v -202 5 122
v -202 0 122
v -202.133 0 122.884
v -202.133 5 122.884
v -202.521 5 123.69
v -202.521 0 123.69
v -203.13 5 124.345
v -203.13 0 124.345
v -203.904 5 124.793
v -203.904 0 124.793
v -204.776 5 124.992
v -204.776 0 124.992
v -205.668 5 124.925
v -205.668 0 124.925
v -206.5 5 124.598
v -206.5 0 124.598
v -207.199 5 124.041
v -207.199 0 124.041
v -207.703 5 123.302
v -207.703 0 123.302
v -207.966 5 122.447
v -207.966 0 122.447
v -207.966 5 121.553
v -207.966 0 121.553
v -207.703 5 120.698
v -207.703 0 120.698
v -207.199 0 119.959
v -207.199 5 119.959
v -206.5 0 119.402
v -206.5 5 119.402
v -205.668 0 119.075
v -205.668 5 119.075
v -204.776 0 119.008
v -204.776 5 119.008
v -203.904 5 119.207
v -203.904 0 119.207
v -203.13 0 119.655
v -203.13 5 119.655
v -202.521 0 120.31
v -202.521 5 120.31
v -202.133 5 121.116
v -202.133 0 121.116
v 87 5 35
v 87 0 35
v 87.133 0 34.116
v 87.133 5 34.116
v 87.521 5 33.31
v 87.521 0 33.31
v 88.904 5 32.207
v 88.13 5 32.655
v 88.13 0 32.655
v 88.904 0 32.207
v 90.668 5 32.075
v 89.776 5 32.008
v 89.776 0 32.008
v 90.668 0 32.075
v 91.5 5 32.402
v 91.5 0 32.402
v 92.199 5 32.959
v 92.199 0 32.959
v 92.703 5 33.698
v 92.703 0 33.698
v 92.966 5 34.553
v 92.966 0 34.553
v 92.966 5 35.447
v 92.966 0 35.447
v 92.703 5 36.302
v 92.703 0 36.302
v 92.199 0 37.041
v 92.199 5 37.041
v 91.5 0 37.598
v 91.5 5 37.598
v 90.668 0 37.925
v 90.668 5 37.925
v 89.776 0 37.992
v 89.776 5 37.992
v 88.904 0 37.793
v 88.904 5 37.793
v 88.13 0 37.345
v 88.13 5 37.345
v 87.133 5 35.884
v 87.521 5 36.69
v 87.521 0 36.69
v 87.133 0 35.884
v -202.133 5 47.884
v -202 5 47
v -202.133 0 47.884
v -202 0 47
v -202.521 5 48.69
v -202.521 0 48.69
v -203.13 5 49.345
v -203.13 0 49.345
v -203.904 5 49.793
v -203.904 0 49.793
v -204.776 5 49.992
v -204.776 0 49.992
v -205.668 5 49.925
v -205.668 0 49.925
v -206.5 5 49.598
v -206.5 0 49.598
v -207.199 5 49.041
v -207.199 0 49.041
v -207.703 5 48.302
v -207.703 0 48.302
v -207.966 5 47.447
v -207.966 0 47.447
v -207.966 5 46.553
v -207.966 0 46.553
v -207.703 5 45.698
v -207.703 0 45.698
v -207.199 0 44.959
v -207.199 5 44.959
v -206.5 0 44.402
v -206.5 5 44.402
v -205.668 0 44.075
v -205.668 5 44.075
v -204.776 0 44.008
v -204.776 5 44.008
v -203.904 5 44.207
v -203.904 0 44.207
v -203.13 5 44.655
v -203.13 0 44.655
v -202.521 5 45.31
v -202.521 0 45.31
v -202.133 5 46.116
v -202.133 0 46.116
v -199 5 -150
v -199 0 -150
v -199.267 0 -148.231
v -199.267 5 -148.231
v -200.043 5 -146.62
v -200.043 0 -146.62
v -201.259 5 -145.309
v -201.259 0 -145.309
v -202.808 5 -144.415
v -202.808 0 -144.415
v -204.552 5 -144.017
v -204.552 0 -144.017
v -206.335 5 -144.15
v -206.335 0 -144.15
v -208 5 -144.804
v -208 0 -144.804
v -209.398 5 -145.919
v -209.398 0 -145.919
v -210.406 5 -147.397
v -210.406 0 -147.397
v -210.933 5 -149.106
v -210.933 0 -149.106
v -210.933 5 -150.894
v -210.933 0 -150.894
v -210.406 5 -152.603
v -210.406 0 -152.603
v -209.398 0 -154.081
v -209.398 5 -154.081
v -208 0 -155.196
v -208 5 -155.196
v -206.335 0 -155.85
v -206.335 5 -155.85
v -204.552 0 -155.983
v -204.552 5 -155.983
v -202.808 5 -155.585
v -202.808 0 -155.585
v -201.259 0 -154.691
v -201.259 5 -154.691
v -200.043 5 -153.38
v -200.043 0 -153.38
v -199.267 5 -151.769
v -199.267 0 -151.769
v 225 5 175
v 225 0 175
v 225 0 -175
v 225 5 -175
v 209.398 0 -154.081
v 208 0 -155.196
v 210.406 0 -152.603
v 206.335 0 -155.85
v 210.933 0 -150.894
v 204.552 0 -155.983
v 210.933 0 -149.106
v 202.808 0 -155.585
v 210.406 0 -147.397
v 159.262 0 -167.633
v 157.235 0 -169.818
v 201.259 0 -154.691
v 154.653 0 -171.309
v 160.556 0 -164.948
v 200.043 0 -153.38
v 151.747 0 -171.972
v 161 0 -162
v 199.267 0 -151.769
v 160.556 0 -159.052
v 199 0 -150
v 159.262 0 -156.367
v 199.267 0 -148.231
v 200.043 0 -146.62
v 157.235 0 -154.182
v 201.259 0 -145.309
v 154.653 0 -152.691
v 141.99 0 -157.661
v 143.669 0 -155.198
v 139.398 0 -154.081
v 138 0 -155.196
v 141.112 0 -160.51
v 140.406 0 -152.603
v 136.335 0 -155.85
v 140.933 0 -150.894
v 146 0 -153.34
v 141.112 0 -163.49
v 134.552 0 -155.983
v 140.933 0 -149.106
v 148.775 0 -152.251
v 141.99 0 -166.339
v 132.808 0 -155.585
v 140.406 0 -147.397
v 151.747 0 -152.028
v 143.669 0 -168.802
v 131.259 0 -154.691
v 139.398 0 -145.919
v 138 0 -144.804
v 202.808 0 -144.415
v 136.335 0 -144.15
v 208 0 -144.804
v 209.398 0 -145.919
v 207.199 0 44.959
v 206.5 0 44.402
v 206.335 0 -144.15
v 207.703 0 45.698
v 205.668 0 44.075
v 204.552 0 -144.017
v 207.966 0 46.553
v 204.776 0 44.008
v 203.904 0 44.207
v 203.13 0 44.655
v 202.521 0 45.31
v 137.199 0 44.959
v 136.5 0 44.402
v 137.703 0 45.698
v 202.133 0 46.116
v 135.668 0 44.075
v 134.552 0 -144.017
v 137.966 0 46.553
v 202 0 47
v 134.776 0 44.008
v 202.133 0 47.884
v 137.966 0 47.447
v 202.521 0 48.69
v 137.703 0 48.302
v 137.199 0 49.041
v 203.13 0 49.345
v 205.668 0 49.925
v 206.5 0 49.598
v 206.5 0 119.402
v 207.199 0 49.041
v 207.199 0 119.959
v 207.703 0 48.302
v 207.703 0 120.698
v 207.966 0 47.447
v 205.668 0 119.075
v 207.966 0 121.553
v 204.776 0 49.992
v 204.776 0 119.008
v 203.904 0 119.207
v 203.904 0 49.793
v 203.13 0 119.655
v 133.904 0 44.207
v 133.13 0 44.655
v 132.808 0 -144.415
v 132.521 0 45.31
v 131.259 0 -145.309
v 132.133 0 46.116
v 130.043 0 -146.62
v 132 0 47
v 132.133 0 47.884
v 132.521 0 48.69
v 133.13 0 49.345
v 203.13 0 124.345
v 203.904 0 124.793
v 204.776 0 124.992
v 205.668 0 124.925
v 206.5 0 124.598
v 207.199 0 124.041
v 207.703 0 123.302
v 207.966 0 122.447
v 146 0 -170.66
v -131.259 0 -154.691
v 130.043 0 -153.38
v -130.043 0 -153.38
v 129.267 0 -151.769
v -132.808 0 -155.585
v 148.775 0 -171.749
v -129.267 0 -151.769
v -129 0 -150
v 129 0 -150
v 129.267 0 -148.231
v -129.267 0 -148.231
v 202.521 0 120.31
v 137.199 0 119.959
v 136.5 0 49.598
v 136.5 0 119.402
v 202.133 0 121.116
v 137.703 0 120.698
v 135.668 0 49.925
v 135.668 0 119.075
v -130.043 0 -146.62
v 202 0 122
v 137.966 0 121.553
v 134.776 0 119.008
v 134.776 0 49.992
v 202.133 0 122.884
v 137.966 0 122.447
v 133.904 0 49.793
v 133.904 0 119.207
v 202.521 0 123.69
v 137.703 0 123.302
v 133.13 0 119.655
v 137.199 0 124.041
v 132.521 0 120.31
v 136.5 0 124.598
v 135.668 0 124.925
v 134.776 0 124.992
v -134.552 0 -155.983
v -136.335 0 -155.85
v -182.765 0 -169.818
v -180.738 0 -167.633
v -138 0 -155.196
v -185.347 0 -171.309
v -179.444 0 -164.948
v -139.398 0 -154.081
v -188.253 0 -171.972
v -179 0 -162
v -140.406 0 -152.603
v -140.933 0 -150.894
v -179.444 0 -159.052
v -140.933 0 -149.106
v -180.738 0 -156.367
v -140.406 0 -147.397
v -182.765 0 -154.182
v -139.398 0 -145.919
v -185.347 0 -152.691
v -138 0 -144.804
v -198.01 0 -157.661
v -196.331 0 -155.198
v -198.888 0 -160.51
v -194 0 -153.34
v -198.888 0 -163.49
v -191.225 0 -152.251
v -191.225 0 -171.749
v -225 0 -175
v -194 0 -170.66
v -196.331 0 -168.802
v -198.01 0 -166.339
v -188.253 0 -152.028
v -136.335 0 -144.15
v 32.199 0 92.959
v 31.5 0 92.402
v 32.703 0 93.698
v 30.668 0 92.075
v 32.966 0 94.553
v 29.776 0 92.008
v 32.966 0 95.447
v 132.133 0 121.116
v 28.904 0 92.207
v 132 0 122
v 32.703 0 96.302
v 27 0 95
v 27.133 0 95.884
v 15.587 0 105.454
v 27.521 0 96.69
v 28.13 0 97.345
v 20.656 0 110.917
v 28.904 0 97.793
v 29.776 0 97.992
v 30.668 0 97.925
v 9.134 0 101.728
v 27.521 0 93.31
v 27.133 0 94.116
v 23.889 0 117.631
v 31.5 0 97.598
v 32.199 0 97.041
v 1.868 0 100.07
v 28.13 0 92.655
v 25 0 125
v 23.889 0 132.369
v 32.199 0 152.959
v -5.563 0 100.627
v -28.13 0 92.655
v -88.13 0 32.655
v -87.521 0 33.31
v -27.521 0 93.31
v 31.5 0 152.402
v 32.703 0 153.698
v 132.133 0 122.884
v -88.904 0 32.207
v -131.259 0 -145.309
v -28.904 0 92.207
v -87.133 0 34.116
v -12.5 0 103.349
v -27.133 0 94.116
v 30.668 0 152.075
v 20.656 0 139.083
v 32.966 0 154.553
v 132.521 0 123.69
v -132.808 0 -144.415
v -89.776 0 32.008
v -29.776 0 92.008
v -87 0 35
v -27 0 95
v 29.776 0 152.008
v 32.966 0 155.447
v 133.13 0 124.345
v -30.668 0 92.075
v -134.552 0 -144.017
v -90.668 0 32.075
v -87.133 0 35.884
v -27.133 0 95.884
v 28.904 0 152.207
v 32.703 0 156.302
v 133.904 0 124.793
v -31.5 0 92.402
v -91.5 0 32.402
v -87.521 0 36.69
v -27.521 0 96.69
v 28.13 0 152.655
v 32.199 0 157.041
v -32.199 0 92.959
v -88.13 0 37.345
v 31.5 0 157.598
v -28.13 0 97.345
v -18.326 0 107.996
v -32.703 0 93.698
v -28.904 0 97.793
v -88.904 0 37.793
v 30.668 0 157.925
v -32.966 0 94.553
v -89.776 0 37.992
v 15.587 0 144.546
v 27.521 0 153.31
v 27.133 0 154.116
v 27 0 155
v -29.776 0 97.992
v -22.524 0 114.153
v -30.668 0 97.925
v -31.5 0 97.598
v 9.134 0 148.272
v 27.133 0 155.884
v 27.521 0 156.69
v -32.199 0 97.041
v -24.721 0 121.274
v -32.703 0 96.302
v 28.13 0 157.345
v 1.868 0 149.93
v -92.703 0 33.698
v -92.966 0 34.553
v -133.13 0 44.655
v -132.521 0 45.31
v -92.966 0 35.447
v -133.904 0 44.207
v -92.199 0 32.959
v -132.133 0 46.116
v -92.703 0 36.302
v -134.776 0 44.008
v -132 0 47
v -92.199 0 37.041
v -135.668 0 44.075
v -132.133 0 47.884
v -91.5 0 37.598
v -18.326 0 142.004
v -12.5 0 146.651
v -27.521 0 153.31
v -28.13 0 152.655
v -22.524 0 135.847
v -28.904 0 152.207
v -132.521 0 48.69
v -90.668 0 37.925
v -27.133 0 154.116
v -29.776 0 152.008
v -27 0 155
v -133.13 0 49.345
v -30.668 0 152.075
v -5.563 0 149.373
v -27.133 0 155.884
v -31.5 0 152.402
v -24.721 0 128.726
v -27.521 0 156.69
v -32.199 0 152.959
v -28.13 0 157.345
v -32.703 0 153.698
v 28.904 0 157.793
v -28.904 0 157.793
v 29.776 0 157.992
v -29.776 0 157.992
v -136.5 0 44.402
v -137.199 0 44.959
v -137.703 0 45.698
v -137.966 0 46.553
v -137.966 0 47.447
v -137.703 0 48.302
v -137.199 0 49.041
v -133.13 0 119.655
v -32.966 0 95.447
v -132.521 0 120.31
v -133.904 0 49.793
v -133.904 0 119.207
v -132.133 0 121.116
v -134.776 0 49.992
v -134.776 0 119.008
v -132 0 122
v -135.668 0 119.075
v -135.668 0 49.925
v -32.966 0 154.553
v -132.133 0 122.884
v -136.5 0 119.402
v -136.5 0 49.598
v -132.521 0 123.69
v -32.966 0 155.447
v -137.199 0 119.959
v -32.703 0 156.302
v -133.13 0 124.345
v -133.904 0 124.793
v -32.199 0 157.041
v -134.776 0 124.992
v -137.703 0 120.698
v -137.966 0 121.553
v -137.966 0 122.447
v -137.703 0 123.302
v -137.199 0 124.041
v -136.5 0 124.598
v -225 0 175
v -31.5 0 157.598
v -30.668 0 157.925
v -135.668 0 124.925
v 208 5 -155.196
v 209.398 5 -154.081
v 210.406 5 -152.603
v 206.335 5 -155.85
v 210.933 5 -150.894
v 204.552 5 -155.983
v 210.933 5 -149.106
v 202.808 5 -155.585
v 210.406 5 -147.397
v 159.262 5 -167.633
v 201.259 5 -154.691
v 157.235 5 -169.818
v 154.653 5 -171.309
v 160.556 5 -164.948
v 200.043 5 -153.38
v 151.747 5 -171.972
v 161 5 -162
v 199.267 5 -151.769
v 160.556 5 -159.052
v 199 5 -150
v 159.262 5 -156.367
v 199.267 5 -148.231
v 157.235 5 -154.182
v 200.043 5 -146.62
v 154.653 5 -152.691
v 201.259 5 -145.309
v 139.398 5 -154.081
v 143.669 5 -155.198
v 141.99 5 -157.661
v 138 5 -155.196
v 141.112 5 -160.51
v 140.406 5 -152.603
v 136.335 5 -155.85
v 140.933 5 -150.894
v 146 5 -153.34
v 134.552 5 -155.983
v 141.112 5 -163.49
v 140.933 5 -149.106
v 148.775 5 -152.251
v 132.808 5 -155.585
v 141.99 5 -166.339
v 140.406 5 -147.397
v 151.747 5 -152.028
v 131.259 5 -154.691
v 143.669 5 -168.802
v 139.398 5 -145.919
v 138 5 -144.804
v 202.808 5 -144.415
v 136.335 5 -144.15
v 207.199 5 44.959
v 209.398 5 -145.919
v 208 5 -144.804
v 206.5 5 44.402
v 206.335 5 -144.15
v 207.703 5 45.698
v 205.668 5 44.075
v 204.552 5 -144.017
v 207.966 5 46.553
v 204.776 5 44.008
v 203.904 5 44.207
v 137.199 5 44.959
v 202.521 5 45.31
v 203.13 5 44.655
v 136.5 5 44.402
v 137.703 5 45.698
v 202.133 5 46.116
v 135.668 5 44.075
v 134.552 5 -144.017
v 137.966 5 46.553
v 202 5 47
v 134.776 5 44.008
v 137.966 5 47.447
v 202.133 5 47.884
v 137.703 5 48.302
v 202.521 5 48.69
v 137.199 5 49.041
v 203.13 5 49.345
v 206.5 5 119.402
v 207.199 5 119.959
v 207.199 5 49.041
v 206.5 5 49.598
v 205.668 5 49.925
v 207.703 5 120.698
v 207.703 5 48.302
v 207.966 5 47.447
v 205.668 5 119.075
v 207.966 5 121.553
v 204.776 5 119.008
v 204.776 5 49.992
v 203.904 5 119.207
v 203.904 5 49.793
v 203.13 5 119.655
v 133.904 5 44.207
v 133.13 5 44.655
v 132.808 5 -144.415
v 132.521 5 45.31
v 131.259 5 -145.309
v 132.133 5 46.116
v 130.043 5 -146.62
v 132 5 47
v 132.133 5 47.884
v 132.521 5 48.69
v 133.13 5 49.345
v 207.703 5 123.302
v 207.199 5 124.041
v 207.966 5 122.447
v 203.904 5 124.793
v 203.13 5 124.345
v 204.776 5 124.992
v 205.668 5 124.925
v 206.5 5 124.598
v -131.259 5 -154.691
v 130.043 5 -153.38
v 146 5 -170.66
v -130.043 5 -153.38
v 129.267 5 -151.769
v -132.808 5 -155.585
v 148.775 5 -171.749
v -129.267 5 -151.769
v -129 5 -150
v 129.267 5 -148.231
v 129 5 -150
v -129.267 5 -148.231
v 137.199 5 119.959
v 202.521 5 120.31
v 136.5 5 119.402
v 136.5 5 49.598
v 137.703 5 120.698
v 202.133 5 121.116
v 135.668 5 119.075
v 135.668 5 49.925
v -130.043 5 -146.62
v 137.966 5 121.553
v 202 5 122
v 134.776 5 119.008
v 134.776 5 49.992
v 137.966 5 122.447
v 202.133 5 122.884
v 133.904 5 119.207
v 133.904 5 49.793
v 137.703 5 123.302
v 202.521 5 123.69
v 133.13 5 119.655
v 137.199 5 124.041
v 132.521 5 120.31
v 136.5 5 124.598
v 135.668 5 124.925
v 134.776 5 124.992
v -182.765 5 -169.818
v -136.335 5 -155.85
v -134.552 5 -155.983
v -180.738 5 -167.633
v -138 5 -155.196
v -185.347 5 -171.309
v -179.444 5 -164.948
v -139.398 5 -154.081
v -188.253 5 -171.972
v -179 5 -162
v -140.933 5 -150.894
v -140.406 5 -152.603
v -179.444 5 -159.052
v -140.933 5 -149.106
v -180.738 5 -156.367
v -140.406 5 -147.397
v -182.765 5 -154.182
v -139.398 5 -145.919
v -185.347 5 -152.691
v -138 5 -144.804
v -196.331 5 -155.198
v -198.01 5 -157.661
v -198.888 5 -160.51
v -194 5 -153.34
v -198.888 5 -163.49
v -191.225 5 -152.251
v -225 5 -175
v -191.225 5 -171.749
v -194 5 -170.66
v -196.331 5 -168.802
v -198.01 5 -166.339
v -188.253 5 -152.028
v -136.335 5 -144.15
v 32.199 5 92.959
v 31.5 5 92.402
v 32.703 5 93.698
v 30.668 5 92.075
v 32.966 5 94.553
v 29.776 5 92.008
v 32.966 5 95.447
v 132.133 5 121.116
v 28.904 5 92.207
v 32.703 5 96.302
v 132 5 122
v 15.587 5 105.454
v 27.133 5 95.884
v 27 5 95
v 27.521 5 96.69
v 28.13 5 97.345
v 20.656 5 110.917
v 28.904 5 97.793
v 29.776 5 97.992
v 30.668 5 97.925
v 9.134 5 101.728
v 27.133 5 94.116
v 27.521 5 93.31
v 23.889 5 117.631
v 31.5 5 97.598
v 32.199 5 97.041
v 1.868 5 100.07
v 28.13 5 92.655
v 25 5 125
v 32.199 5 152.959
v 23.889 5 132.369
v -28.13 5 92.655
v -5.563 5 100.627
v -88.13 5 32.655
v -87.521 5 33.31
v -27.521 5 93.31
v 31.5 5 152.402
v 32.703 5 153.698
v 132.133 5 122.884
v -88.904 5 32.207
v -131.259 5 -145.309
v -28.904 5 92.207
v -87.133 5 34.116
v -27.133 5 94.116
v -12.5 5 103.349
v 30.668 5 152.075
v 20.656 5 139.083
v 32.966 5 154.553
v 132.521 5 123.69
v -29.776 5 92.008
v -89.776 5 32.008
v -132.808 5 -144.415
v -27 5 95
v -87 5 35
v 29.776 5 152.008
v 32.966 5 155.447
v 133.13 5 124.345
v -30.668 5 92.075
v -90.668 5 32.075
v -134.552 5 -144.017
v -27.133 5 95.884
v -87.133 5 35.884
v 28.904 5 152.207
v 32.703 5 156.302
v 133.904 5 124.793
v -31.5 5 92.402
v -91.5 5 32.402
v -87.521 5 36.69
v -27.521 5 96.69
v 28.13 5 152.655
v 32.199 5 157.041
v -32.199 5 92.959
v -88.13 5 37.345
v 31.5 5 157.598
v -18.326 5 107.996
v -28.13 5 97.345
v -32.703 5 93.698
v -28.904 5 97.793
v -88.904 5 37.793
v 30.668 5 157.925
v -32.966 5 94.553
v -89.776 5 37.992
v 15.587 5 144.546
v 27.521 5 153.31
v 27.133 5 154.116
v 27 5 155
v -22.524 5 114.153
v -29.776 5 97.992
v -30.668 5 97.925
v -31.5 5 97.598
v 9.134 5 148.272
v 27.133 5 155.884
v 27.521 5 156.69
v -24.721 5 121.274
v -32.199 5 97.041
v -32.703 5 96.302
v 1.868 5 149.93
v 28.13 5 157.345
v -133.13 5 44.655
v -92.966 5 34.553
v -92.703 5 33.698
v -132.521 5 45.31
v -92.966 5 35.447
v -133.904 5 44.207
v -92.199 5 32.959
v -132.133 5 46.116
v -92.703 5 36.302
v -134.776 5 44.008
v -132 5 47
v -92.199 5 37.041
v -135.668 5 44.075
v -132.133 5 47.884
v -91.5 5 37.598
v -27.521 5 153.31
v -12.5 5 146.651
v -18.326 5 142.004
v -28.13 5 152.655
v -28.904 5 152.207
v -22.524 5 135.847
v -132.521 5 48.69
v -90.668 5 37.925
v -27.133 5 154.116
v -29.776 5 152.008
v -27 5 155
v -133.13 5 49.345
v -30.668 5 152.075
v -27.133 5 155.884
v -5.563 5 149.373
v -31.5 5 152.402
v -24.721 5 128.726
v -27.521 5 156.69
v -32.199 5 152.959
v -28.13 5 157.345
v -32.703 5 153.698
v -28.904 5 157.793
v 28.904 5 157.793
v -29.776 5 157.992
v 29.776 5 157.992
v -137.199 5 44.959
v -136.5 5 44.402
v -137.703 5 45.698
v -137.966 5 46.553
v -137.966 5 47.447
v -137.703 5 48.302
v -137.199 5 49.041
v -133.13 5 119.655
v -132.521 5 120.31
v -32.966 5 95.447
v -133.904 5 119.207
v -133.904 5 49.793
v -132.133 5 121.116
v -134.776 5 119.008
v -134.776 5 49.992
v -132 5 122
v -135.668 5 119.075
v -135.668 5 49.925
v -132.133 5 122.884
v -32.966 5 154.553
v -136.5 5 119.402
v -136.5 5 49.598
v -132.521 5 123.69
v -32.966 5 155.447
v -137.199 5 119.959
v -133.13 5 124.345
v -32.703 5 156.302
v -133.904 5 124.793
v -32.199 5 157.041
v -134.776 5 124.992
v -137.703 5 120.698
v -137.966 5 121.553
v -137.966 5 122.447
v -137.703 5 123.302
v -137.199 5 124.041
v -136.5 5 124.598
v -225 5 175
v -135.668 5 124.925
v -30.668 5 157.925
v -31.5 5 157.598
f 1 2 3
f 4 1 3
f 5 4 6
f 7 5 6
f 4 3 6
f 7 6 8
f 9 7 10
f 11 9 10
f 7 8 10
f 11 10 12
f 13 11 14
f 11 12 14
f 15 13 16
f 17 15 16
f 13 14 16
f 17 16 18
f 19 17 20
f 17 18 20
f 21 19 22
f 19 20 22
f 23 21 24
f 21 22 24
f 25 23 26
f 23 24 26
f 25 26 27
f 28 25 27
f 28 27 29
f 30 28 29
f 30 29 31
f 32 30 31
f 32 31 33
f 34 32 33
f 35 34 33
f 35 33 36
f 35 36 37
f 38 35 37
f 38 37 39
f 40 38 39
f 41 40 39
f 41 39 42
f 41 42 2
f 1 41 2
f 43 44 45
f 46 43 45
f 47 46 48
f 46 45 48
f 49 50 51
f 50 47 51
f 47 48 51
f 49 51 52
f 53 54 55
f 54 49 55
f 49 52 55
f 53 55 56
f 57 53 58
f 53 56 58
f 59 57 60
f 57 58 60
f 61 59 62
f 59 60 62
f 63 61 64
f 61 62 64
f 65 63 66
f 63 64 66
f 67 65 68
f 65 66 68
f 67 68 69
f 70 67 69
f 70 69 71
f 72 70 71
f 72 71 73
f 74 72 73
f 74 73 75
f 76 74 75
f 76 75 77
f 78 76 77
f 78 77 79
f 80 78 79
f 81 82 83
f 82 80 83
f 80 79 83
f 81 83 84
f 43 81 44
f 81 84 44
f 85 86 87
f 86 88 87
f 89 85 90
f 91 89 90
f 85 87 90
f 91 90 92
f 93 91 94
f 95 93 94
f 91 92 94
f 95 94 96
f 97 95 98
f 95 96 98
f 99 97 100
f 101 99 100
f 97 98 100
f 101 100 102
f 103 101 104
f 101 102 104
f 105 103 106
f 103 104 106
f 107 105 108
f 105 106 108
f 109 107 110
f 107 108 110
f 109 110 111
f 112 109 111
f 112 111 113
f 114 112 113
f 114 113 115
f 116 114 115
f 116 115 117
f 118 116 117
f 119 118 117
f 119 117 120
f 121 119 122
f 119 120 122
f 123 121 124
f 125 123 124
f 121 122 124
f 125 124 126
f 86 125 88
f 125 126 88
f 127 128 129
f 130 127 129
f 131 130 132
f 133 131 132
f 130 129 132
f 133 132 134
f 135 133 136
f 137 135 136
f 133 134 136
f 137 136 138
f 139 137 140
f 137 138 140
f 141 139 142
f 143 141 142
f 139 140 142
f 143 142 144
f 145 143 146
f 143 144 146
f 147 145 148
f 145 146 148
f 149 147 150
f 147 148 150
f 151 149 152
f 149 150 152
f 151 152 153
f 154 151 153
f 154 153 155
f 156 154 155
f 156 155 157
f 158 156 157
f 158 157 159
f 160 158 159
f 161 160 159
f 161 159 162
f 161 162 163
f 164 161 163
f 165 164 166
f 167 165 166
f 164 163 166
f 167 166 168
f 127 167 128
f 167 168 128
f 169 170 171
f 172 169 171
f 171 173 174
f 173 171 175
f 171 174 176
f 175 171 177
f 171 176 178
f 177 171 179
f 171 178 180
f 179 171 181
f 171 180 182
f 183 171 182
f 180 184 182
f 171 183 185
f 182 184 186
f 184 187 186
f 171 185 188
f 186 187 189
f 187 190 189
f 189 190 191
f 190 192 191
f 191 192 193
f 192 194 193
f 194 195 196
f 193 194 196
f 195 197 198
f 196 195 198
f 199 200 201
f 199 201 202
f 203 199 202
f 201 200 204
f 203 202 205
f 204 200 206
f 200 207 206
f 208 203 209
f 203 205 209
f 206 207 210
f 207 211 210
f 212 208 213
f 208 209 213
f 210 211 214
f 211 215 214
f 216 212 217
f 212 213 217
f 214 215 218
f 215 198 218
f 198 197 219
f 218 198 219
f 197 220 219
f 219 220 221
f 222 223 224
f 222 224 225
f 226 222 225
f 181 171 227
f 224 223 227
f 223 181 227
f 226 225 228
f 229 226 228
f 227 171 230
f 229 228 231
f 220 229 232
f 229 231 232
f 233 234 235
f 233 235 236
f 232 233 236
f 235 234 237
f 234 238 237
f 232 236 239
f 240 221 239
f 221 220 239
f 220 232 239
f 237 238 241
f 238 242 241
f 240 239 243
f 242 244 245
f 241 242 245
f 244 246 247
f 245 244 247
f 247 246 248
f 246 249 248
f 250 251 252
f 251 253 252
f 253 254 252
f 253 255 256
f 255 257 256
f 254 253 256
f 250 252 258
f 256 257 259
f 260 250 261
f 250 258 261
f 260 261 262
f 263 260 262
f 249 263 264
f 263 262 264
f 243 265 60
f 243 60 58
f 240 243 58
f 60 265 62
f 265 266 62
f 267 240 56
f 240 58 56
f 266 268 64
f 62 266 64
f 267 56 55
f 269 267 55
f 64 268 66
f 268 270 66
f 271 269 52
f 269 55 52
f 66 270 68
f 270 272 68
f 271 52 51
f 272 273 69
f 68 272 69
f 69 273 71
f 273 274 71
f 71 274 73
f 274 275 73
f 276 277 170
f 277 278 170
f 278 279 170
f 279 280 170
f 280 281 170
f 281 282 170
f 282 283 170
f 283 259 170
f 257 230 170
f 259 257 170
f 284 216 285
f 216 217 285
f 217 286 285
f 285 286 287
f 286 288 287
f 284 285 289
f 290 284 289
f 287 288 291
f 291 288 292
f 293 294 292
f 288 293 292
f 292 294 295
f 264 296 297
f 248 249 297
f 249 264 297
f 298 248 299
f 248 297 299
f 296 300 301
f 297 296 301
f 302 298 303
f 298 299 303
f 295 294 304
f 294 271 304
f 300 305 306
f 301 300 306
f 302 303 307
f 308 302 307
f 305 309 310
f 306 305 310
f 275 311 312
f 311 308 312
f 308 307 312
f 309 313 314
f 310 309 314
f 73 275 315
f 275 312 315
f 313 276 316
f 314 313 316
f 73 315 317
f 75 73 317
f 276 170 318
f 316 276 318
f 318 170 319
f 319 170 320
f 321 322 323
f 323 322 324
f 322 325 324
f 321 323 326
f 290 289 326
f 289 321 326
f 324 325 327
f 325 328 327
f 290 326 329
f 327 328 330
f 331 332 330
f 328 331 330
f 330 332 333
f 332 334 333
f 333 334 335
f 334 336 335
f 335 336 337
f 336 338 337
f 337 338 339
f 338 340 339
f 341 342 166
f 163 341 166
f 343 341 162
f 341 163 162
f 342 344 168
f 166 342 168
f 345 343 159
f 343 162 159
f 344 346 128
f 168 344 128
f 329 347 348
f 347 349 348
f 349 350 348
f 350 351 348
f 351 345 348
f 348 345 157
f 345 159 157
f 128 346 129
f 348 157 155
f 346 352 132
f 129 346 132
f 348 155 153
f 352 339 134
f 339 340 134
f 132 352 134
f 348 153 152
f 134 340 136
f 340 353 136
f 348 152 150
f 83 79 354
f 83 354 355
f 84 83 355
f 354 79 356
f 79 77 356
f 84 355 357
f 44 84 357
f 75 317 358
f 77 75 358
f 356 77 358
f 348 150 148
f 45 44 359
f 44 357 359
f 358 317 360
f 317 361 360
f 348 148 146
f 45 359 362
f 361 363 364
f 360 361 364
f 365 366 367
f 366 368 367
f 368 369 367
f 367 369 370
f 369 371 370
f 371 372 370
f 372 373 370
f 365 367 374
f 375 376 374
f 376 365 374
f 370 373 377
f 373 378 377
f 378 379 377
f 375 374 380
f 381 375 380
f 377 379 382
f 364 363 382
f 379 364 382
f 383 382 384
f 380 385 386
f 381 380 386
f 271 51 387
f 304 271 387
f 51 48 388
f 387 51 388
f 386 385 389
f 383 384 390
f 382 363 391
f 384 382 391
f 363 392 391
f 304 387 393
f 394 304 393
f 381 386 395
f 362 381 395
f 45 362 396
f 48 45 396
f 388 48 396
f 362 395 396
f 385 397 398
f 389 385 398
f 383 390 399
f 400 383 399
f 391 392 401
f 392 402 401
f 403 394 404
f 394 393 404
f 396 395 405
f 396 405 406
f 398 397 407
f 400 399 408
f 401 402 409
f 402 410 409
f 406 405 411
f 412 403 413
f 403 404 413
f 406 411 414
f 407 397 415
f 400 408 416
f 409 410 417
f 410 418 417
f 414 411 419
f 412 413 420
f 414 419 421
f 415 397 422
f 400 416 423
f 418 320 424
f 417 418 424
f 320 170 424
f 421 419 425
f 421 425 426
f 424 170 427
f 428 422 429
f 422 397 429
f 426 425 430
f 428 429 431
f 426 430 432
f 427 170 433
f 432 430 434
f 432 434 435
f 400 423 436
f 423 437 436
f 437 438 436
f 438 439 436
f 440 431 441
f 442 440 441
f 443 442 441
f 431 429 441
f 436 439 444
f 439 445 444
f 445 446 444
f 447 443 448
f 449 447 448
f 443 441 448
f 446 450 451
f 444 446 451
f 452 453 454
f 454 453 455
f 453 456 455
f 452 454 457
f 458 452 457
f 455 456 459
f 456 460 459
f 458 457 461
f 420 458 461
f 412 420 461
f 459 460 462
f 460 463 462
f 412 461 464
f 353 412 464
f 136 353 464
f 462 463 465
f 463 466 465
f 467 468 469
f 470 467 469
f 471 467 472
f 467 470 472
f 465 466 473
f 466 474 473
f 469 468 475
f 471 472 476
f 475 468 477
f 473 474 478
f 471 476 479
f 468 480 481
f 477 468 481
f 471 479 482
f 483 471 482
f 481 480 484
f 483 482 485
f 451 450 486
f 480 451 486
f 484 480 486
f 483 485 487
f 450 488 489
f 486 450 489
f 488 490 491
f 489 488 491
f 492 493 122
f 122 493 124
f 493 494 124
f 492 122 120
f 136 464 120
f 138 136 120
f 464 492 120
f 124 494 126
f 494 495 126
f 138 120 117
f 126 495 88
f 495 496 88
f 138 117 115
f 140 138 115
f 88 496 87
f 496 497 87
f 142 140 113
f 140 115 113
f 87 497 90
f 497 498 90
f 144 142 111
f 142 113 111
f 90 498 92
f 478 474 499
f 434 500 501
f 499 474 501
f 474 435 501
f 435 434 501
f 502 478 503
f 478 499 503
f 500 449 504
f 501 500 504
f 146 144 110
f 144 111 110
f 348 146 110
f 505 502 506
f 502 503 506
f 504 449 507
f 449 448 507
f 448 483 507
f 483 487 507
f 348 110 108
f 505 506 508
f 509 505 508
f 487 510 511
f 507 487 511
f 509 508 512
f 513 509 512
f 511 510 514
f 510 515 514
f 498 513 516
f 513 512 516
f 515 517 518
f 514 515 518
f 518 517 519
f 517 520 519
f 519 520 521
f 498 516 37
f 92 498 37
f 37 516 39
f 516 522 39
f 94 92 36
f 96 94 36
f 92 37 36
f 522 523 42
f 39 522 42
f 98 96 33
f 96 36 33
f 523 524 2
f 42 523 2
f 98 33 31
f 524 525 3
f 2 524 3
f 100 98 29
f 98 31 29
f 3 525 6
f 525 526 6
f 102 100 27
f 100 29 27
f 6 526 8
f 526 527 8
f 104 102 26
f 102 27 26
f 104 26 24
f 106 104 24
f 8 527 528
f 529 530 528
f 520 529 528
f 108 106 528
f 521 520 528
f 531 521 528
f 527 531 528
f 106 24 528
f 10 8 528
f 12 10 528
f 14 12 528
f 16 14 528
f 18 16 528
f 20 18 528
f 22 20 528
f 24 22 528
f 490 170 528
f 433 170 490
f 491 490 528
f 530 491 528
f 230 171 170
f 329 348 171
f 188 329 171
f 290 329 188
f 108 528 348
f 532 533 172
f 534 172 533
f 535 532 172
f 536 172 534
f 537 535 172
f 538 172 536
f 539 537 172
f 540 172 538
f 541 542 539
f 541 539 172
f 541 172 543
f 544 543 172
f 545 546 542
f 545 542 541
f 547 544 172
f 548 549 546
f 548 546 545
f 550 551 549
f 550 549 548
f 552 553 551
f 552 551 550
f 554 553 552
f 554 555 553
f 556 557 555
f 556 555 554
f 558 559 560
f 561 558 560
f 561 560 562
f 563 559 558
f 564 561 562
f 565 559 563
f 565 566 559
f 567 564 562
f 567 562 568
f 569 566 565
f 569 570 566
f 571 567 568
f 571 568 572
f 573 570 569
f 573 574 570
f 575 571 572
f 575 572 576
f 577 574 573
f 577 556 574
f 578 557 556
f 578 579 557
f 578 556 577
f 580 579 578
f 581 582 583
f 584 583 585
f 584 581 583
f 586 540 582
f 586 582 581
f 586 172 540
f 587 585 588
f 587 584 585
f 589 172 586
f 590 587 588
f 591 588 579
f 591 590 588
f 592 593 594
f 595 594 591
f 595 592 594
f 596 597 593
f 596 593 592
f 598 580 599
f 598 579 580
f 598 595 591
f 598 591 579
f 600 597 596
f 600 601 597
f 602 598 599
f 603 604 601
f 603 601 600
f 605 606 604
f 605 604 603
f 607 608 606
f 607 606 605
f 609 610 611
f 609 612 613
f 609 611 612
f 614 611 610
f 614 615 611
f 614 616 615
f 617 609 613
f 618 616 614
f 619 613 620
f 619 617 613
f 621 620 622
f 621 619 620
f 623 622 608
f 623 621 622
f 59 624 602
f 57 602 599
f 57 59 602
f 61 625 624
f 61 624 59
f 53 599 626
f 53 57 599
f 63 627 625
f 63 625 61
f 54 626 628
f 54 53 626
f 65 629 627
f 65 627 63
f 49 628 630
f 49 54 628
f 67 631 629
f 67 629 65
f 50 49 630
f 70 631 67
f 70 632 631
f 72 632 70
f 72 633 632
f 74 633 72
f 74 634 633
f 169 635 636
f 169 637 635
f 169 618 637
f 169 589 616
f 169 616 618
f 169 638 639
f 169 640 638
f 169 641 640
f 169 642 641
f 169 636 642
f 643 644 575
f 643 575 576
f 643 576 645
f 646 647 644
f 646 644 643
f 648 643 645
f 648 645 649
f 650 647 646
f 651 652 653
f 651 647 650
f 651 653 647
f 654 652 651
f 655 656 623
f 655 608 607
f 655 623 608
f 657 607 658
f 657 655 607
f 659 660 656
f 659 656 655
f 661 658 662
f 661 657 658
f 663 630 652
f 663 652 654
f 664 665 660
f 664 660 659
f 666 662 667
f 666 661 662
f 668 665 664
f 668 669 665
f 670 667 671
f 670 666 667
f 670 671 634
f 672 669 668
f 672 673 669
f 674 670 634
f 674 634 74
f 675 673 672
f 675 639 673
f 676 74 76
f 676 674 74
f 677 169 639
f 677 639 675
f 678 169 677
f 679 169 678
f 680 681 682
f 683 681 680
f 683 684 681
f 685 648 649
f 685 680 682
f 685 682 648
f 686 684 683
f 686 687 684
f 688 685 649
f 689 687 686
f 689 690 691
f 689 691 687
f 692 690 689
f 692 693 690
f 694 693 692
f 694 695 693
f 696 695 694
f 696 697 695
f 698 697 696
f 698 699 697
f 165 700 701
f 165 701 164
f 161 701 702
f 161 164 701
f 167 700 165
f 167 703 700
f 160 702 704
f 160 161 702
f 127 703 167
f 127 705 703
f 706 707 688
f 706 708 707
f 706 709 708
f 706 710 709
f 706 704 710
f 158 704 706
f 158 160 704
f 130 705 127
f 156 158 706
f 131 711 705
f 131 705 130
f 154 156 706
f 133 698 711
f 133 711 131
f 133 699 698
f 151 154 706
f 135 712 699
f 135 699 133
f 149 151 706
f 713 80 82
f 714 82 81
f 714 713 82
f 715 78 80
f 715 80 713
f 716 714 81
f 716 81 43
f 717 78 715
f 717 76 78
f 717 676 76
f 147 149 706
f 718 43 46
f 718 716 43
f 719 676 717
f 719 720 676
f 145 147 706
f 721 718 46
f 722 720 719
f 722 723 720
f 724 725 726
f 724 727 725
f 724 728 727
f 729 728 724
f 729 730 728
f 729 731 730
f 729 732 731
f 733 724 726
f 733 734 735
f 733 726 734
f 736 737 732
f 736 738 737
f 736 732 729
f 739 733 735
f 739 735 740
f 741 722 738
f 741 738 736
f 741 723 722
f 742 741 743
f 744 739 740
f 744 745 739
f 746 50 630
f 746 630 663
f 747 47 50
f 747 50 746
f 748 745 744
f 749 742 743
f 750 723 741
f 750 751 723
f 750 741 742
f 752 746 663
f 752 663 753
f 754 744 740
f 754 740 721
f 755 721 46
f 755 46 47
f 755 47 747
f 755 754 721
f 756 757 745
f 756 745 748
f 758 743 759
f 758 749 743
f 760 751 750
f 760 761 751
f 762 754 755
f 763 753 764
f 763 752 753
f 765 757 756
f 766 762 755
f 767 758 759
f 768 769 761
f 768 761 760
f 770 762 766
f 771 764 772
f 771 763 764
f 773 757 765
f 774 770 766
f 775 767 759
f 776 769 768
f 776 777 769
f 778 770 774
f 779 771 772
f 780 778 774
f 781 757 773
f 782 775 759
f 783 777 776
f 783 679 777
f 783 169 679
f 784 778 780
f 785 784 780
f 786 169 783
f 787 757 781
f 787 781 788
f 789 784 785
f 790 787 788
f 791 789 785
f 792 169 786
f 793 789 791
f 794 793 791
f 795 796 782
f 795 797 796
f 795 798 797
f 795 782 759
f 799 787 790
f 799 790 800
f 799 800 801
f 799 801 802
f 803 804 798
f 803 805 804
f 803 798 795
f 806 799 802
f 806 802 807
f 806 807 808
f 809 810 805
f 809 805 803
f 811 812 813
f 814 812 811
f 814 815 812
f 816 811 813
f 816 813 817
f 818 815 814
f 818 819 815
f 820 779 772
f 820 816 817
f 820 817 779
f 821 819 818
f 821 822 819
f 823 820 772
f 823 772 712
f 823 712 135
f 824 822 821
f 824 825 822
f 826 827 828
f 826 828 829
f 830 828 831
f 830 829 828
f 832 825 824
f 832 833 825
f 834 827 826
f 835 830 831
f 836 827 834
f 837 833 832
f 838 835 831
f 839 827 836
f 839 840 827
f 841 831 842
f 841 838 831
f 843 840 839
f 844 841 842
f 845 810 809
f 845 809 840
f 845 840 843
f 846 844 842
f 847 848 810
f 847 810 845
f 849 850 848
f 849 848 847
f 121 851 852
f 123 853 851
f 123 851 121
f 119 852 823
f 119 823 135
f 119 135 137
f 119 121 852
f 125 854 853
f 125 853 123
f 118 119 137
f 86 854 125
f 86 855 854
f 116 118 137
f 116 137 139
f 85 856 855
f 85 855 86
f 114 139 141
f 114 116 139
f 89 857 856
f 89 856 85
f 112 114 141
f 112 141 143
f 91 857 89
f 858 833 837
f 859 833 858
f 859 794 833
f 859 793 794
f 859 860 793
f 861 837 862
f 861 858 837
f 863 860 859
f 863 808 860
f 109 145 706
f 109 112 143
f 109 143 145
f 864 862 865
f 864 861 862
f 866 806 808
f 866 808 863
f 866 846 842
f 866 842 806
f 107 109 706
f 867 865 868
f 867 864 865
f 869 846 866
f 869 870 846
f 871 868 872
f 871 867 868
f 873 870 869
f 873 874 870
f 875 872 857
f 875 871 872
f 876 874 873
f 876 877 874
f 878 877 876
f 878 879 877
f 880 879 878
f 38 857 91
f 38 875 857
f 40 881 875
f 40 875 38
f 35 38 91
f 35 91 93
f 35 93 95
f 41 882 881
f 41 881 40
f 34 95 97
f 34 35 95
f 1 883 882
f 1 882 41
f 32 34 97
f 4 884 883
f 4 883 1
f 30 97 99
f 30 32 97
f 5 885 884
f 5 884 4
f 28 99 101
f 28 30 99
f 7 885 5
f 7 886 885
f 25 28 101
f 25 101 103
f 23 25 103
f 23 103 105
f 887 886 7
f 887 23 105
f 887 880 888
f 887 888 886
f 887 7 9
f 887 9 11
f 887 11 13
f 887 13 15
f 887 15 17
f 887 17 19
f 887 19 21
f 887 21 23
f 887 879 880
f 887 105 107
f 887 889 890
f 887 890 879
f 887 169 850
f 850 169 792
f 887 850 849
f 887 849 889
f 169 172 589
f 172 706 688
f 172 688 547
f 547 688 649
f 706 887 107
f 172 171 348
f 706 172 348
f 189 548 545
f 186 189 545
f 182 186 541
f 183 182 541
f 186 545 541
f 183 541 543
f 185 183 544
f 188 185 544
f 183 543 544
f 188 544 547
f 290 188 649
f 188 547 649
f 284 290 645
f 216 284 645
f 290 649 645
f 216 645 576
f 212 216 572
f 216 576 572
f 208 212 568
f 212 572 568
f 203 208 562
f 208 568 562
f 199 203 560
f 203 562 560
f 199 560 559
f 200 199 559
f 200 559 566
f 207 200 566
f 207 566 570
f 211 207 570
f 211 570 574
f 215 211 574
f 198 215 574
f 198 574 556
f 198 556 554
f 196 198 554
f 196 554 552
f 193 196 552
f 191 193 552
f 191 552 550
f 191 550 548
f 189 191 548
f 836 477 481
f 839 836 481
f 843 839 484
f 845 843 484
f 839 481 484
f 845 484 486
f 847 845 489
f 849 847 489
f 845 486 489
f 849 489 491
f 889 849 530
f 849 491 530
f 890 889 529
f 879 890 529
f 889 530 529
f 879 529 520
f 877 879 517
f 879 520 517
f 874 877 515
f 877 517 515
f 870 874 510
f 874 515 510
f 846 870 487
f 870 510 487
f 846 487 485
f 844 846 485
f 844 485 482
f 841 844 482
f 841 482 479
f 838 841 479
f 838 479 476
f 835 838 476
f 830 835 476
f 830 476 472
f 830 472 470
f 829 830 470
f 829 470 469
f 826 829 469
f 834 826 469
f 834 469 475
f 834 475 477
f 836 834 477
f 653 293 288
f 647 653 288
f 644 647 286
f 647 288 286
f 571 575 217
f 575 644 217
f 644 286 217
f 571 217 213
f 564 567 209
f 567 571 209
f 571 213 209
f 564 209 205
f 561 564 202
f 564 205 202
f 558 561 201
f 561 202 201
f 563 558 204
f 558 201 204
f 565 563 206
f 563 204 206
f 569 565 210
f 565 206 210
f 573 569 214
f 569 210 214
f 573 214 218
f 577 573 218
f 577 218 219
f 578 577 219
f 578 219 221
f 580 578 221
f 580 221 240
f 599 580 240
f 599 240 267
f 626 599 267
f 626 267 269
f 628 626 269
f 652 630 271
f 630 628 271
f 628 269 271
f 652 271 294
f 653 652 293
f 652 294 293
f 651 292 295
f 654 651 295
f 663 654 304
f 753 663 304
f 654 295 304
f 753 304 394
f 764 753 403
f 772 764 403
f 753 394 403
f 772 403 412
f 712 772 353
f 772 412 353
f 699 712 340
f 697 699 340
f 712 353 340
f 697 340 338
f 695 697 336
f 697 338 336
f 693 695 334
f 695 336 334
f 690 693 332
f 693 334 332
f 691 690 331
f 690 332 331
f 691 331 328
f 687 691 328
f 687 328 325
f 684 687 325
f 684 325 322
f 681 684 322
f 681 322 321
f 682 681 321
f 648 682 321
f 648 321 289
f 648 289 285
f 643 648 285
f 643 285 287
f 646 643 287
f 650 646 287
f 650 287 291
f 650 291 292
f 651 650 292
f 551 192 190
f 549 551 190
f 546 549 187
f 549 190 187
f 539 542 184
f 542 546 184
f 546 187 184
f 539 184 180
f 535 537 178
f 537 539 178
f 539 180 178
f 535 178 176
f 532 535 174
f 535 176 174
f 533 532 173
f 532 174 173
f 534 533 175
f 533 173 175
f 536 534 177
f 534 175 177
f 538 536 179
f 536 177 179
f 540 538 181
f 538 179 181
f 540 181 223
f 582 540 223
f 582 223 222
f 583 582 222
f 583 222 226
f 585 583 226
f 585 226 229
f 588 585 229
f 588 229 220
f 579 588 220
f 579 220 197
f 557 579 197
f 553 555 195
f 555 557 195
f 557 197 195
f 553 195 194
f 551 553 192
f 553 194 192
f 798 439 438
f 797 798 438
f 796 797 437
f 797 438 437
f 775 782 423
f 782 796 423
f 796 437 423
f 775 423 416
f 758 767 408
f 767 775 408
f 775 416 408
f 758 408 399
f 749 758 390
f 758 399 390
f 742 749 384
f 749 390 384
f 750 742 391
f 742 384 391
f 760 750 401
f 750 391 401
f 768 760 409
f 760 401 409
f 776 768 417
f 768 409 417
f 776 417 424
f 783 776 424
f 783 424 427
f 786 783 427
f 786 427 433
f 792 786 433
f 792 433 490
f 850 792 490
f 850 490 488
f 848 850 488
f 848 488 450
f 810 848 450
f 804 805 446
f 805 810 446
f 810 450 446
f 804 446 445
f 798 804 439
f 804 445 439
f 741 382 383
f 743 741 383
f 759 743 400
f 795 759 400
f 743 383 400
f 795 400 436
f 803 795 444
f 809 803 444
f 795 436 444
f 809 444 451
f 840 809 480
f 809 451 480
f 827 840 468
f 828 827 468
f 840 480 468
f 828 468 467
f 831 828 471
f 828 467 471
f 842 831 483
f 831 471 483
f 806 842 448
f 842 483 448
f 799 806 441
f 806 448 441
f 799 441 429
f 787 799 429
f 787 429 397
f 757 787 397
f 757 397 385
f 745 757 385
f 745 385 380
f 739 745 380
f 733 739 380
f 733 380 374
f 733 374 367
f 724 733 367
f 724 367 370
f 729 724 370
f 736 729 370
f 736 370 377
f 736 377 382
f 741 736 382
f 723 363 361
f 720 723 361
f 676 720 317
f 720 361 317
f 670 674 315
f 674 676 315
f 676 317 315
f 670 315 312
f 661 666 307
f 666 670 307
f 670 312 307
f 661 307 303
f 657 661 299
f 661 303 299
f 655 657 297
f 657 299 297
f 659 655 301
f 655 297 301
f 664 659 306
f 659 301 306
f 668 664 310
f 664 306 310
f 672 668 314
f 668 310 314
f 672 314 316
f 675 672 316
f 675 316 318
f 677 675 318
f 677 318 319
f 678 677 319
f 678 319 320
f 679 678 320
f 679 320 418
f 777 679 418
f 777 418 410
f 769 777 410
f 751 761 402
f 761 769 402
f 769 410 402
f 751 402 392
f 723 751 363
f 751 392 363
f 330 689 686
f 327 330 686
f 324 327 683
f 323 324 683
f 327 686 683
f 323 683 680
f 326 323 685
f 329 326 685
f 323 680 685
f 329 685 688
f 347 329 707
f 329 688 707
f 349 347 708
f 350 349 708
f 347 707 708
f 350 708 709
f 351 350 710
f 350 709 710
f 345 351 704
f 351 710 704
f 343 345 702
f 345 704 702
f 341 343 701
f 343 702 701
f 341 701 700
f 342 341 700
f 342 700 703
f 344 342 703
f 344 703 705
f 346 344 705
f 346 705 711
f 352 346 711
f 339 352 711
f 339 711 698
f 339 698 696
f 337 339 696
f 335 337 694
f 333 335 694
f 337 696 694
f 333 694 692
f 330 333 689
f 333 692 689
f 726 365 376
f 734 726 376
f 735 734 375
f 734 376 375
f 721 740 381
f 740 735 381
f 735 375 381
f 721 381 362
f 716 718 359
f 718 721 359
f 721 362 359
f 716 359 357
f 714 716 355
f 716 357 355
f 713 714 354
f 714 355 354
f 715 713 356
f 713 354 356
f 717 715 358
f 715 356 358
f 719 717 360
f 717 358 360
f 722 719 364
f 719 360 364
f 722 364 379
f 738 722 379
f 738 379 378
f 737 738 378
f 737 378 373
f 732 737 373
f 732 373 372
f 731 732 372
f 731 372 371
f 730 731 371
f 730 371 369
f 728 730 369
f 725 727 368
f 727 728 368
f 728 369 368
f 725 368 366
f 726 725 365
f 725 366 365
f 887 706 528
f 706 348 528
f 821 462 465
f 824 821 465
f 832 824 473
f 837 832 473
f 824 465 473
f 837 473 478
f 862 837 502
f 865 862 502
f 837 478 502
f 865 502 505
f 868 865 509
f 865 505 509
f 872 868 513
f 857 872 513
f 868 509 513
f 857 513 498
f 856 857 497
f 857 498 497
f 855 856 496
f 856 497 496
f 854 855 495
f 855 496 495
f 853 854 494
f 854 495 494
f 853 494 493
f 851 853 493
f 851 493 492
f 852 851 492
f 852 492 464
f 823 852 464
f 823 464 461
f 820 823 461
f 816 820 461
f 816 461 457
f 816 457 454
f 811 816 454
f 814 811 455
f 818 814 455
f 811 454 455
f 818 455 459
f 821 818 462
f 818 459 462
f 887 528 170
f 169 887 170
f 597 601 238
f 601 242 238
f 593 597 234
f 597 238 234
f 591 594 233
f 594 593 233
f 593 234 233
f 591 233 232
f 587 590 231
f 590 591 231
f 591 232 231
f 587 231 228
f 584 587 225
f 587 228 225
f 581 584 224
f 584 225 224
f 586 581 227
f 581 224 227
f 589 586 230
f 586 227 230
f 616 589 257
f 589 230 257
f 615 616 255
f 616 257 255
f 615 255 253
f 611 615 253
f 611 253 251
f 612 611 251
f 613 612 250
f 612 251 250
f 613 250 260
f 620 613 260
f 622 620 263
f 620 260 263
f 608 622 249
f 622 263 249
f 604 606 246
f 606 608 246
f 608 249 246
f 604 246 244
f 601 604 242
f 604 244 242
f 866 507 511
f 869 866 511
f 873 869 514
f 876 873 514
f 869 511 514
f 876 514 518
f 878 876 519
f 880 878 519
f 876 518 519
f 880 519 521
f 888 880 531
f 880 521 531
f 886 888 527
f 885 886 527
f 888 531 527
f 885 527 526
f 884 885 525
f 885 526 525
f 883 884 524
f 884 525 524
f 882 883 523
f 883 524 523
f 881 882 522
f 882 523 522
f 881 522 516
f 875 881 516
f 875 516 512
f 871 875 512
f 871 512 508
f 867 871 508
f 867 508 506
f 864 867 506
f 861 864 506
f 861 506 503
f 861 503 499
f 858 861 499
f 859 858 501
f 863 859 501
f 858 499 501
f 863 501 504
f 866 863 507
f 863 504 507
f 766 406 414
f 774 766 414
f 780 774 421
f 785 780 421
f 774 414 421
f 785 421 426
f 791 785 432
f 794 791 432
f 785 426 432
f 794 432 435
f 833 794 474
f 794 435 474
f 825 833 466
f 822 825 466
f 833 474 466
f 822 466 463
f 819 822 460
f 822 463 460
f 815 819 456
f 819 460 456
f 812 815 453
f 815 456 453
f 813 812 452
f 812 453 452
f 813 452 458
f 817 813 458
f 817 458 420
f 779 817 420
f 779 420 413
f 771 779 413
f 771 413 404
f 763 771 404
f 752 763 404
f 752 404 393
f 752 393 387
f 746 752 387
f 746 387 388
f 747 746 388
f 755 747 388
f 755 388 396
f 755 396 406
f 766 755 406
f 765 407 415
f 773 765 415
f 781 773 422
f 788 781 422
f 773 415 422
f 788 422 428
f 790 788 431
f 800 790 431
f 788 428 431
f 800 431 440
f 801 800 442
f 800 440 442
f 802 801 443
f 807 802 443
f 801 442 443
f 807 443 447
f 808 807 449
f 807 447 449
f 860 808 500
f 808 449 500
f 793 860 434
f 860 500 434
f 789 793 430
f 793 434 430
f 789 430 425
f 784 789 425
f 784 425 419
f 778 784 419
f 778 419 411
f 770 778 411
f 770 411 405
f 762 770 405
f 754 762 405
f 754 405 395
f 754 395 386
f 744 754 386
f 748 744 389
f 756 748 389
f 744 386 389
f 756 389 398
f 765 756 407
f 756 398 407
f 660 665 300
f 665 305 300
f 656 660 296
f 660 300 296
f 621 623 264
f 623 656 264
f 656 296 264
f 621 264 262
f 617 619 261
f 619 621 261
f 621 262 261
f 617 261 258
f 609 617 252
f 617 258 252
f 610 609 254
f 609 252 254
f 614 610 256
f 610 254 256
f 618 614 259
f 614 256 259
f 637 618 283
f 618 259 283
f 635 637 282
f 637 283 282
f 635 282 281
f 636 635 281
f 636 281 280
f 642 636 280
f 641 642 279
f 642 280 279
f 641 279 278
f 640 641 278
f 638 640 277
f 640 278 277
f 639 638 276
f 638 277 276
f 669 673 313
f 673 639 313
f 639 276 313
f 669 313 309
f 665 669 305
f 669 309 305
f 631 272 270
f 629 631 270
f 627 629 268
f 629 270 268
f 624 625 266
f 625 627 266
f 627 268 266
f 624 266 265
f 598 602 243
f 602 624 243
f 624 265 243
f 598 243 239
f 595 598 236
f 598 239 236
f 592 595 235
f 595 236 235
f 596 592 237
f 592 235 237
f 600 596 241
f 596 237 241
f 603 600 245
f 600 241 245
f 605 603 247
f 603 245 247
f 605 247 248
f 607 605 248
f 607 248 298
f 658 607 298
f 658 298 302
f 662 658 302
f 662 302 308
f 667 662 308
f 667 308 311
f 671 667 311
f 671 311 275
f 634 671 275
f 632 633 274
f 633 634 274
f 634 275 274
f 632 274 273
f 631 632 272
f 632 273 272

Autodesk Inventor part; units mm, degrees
ref_plane "YZ Plane" through (0, 0, 0) normal (1, 0, 0) x (0, 1, 0)
ref_plane "XZ Plane" through (0, 0, 0) normal (0, 1, 0) x (-1, 0, 0)
ref_plane "XY Plane" through (0, 0, 0) normal (0, 0, 1) x (1, 0, 0)
sketch "Sketch1" plane through (0, 0, 0) normal (0, 1, 0) x (-1, 0, 0)
  line L0 (225, 175) -> (-225, 175)
  line L1 (-225, 175) -> (-225, -175)
  line L2 (-225, -175) -> (225, -175)
  line L3 (225, -175) -> (225, 175)
  line L4 (225, 175) -> (-225, -175) construction
  line L5 (-225, 175) -> (225, -175) construction
  point P0 (0, 0)
  dimension "d0" = 450
  dimension "d1" = 350
extrude "Extrusion1" add sketch "Sketch1" along normal blind 5
sketch "Sketch2" plane through (0, 0, 0) normal (0, -1, 0) x (1, 0, 0)
  line L0 (225, 175) -> (225, -175) projected
  line L1 (-225, 175) -> (225, 175) projected
  line L2 (-225, -175) -> (-225, 175) projected
  line L3 (225, -175) -> (-225, -175) projected
  line L4 (-198.5, -164) -> (-198.5, -170) projected
  line L5 (-220, -170) -> (-198.5, -170) projected
  line L6 (-220, -115) -> (-220, -170) projected
  line L7 (-220, -115) -> (-120, -115) projected
  line L8 (-120, -115) -> (-120, -170) projected
  line L9 (-180, -170) -> (-120, -170) projected
  line L10 (-180, -170) -> (-180, -159) projected
  arc A0 (-180, -159) -> (-185, -154) centre (-185, -159) ccw projected
  line L11 (-185, -154) -> (-188.5, -154) projected
  arc A1 (-188.5, -154) -> (-198.5, -164) centre (-188.5, -164) ccw projected
  circle A2 centre (-205, -150) radius 6.1 projected
  circle A3 centre (-135, -150) radius 6.1 projected
  circle A4 centre (-205, 122) radius 3.05 projected
  circle A5 centre (-135, 47) radius 3.05 projected
  circle A6 centre (-135, 122) radius 3.05 projected
  circle A7 centre (-205, 47) radius 3.05 projected
  line L12 (-120, 134.5) -> (-120, 34.5) projected
  line L13 (-220, 34.5) -> (-120, 34.5) projected
  line L14 (-220, 134.5) -> (-220, 34.5) projected
  line L15 (-120, 134.5) -> (-220, 134.5) projected
  circle A8 centre (30, 95) radius 3.1 projected
  circle A9 centre (30, 155) radius 3.1 projected
  circle A10 centre (-30, 95) radius 3.1 projected
  circle A11 centre (-30, 155) radius 3.1 projected
  circle A12 centre (90, 215) radius 3.1 projected
  circle A13 centre (90, 35) radius 3.1 projected
  circle A14 centre (-90, 215) radius 3.1 projected
  circle A15 centre (-90, 35) radius 3.1 projected
  circle A16 centre (0, 125) radius 25 projected
  line L16 (100, 225) -> (100, 25) projected
  line L17 (100, 25) -> (-100, 25) projected
  line L18 (-100, 25) -> (-100, 225) projected
  line L19 (-100, 225) -> (100, 225) projected
  circle A17 centre (-205, -150) radius 6
  circle A18 centre (-135, -150) radius 6
  circle A19 centre (-205, 47) radius 3
  circle A20 centre (-205, 122) radius 3
  circle A21 centre (-135, 47) radius 3
  circle A22 centre (-135, 122) radius 3
  circle A23 centre (-90, 35) radius 3
  circle A24 centre (-30, 155) radius 3
  circle A25 centre (-30, 95) radius 3
  point P0 (0, 0)
  dimension "d4" = 12
  dimension "d5" = 12
  dimension "d6" = 6
  dimension "d7" = 6
  dimension "d8" = 6
  dimension "d9" = 6
  dimension "d10" = 6
  dimension "d11" = 6
  dimension "d12" = 6
extrude "Extrusion2" cut sketch "Sketch2" against normal blind 5 contours A17 | A18 | A19 | A20 | A21 | A22 | A23 | A24 | A25
mirror "Mirror1" about plane through (0, 0, 0) normal (1, 0, 0) of "Extrusion2"
sketch "Sketch3" plane through (0, 0, 0) normal (0, -1, 0) x (1, 0, 0)
  circle A0 centre (30, 95) radius 3.1 projected
  circle A1 centre (30, 155) radius 3.1 projected
  circle A2 centre (-30, 95) radius 3.1 projected
  circle A3 centre (-30, 155) radius 3.1 projected
  circle A4 centre (90, 215) radius 3.1 projected
  circle A5 centre (90, 35) radius 3.1 projected
  circle A6 centre (-90, 215) radius 3.1 projected
  circle A7 centre (-90, 35) radius 3.1 projected
  circle A8 centre (0, 125) radius 25 projected
  line L0 (100, 225) -> (100, 25) projected
  line L1 (100, 25) -> (-100, 25) projected
  line L2 (-100, 25) -> (-100, 225) projected
  line L3 (-100, 225) -> (100, 225) projected
  point P0 (0, 0)
extrude "Extrusion3" cut sketch "Sketch3" against normal blind 5 contours A8
sketch "Sketch6" plane through (0, 5, 0) normal (0, 1, 0) x (1, 0, 0)
  circle A0 centre (0, -125) radius 25 projected
  circle A1 centre (205, -47) radius 3 projected
  circle A2 centre (90, -35) radius 3 projected
  circle A3 centre (30, -95) radius 3 projected
  circle A4 centre (205, -122) radius 3 projected
  circle A5 centre (135, 150) radius 6 projected
  circle A6 centre (135, -122) radius 3 projected
  circle A7 centre (30, -155) radius 3 projected
  circle A8 centre (135, -47) radius 3 projected
  circle A9 centre (205, 150) radius 6 projected
  circle A10 centre (-205, -47) radius 3 projected
  circle A11 centre (-90, -35) radius 3 projected
  circle A12 centre (-30, -95) radius 3 projected
  circle A13 centre (-205, -122) radius 3 projected
  circle A14 centre (-135, 150) radius 6 projected
  circle A15 centre (-135, -122) radius 3 projected
  circle A16 centre (-30, -155) radius 3 projected
  circle A17 centre (-135, -47) radius 3 projected
  circle A18 centre (-205, 150) radius 6 projected
  line L0 (225, -175) -> (225, 175) projected
  line L1 (225, 175) -> (-225, 175) projected
  line L2 (-225, 175) -> (-225, -175) projected
  line L3 (-225, -175) -> (225, -175) projected
  circle A19 centre (-189, 162) radius 10
  circle A20 centre (151, 162) radius 10
  point P0 (0, 0)
  dimension "d30" = 20
  dimension "d31" = 13
  dimension "d32" = 36
  dimension "d33" = 20
  dimension "d34" = 13
  dimension "d35" = 74
extrude "Extrusion6" cut sketch "Sketch6" against normal blind 5 contours A19 | A20
properties part number "acrylic_upper" material "ABS Plastic"
